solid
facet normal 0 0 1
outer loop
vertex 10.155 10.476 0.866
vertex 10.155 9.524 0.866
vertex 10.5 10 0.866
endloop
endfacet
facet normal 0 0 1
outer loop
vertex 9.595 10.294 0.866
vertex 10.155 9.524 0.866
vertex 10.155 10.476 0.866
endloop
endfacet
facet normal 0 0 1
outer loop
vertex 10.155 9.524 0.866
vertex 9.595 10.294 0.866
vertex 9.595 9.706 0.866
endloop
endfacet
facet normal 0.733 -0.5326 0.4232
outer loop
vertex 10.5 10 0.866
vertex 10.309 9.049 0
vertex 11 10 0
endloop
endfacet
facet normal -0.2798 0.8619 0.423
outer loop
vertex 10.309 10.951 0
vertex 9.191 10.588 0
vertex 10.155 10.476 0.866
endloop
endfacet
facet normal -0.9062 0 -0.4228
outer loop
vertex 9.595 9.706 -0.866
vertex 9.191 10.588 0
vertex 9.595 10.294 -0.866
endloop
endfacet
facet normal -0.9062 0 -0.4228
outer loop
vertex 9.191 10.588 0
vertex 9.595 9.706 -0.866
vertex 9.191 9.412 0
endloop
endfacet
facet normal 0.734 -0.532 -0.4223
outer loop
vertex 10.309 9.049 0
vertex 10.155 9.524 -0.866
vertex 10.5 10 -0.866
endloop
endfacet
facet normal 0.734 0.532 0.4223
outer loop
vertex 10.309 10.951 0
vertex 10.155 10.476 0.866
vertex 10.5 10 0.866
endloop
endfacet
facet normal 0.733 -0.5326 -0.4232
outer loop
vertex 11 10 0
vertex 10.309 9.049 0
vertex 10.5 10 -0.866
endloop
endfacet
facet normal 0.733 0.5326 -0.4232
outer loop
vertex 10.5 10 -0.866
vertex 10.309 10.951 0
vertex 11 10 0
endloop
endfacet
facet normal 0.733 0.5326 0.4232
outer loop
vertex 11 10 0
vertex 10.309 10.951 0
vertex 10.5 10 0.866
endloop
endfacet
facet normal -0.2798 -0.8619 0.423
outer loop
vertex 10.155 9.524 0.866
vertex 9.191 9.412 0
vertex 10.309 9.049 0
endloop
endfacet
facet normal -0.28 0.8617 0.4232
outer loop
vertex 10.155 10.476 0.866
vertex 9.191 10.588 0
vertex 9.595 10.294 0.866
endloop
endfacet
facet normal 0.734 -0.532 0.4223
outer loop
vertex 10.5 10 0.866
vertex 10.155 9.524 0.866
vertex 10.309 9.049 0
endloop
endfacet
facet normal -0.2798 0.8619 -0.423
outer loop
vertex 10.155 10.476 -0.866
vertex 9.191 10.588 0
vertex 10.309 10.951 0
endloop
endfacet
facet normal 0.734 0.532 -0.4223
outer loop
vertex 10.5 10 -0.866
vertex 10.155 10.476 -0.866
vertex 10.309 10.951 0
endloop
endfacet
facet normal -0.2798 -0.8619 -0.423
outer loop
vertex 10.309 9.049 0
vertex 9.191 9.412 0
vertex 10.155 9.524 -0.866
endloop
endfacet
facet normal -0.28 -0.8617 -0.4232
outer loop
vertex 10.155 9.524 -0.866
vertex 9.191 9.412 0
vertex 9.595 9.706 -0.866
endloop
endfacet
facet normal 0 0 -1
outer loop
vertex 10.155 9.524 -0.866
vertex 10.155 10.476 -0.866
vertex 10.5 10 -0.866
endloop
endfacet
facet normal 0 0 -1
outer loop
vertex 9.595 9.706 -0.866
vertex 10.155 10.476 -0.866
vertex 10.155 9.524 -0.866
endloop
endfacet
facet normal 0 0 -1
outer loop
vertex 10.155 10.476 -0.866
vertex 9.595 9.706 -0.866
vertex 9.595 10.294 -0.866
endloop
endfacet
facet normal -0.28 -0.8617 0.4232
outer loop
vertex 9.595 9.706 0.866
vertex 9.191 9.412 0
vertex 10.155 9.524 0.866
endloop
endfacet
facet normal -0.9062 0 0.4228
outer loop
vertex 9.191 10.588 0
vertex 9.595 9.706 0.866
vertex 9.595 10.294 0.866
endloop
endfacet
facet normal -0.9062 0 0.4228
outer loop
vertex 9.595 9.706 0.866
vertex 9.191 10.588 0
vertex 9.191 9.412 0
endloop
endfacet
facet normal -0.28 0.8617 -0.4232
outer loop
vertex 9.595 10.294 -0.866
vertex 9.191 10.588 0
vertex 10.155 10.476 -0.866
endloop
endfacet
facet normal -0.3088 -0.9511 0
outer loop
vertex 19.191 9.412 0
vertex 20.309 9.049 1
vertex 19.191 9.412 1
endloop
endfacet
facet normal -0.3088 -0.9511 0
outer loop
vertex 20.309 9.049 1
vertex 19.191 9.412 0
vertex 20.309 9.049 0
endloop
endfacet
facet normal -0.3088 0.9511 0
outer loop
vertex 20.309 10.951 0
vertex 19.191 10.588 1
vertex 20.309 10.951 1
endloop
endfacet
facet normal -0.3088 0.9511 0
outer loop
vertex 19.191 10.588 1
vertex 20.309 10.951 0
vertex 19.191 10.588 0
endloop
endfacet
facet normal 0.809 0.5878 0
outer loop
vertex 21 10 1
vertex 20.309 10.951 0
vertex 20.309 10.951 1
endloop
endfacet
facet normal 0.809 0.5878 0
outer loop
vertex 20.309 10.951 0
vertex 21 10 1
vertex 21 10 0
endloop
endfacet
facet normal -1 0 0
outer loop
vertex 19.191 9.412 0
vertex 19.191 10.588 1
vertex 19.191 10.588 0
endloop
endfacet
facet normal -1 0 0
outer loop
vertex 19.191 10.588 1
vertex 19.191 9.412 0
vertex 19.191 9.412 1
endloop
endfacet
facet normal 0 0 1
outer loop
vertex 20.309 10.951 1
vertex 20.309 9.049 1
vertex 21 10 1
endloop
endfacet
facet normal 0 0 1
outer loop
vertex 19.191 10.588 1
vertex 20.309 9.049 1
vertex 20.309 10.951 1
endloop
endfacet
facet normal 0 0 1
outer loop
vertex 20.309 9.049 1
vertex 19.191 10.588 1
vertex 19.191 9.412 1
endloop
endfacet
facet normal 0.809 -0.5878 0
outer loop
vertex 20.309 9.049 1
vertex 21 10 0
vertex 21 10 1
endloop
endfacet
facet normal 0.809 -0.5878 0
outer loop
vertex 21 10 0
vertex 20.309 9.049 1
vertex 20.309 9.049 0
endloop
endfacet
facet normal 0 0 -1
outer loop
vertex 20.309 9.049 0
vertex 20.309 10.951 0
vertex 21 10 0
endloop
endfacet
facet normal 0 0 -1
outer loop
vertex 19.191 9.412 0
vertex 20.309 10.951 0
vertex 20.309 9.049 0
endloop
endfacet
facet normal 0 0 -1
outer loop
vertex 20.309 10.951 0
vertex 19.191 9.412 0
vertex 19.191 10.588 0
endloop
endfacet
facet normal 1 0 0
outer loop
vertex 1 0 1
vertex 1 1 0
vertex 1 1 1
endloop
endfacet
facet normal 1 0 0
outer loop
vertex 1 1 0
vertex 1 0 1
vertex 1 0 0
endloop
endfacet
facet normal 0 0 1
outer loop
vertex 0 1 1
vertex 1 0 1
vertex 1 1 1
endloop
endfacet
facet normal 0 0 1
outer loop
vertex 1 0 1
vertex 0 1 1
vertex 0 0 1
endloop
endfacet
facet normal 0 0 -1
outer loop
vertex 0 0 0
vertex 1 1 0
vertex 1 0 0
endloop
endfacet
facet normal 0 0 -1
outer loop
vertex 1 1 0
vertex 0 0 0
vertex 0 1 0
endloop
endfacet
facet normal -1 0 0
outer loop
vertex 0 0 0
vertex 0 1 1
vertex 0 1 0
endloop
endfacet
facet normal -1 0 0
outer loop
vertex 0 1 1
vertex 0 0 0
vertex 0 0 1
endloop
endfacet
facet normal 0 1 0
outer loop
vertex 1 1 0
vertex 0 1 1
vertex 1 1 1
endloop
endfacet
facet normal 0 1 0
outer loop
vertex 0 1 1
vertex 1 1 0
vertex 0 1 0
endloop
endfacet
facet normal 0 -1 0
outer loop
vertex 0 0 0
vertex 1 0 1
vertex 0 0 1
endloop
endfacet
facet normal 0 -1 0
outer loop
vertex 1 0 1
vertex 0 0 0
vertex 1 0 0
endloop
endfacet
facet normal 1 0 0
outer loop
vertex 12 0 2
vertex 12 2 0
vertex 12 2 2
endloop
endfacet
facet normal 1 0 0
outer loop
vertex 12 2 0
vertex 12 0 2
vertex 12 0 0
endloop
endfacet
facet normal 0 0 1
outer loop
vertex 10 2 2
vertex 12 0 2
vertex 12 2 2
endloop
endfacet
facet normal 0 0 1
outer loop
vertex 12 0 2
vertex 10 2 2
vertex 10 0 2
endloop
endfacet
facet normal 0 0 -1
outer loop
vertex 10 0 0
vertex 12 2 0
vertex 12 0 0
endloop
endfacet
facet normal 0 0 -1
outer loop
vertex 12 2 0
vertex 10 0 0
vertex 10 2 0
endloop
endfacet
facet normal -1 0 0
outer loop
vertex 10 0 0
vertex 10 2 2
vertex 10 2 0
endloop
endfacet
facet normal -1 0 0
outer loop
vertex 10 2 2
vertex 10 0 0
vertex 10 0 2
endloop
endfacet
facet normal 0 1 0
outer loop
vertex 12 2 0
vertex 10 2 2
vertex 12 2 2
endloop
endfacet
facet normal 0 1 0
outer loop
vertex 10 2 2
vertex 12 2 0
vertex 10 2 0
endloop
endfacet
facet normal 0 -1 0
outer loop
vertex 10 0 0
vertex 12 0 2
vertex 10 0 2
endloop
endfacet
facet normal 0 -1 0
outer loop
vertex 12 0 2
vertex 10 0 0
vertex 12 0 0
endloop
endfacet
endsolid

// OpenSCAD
cube();
translate([10,0])
  cube(2);

translate([10,10])
  union(){
    sphere();
    translate([10,0])
      cylinder();
  }
